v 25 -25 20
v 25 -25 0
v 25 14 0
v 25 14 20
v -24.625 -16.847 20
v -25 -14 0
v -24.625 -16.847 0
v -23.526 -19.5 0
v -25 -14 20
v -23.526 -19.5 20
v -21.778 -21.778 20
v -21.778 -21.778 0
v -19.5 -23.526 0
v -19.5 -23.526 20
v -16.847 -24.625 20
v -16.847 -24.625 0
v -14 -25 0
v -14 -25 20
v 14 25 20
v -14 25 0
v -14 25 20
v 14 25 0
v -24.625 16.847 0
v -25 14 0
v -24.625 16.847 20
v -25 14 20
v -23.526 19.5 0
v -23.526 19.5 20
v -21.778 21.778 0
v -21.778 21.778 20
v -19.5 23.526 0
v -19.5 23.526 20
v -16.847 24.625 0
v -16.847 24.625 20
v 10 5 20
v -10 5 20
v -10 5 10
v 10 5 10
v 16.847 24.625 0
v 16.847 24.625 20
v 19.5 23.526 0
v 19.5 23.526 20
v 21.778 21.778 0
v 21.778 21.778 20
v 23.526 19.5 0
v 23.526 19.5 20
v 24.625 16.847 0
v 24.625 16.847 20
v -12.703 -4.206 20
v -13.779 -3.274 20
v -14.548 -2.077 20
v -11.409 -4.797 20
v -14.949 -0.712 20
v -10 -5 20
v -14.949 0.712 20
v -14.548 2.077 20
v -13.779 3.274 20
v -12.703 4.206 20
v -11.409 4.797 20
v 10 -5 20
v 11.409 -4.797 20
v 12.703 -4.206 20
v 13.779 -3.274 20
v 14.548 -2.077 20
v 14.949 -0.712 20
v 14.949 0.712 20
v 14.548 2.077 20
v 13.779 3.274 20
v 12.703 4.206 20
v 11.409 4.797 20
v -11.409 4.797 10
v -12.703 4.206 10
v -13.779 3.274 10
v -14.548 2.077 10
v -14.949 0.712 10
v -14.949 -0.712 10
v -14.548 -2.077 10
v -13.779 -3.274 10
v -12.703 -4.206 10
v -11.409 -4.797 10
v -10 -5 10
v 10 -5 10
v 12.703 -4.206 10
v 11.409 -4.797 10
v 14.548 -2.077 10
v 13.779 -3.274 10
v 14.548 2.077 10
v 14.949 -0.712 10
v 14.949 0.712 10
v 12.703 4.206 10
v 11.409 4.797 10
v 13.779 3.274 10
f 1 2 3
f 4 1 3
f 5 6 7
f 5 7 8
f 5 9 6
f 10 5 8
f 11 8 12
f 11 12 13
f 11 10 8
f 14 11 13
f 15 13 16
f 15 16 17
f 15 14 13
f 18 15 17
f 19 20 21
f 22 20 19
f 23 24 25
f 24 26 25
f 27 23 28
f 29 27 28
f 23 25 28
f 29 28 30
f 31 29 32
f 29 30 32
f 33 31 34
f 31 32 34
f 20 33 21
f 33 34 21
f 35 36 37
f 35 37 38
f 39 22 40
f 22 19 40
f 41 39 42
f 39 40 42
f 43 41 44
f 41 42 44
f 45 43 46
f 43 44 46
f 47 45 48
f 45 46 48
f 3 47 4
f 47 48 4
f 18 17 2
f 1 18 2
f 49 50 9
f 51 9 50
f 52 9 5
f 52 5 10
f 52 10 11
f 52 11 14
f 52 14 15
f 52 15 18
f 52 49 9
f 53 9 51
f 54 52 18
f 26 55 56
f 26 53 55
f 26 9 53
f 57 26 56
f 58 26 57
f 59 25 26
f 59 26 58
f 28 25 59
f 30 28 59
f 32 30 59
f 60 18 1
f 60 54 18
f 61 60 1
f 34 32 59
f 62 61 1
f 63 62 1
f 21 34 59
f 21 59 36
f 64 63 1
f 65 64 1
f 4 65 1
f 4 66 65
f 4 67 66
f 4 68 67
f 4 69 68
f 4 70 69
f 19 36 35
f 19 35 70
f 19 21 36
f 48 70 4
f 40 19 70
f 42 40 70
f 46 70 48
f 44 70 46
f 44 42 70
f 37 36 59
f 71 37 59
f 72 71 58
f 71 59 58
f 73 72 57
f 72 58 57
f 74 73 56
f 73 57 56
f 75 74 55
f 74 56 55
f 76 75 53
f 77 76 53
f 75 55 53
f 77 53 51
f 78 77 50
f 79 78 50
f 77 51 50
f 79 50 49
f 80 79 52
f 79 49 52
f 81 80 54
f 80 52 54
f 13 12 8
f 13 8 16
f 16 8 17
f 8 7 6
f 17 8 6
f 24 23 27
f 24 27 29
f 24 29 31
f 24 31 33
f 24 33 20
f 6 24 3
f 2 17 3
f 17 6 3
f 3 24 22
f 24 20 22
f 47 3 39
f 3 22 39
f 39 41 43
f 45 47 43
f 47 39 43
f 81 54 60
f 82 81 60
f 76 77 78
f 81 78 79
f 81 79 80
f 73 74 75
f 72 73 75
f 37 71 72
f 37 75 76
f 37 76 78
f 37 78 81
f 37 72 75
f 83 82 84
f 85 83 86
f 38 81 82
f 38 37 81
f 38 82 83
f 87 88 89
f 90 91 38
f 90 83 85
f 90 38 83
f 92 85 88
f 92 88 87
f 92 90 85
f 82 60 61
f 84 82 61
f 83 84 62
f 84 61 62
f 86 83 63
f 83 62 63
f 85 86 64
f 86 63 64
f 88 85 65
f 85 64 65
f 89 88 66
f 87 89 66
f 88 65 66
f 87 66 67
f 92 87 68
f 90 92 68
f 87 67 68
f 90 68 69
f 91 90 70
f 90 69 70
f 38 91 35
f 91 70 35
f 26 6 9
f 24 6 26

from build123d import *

# Parameters (mm, degrees)
SKETCH_W     = 50
SKETCH_H     = 50
PAD_DEPTH    = 20
POCKET_DEPTH = 10
FILLET_R     = 11


with BuildPart() as part:
    # Sketch → Pad (new body)
    with BuildSketch(Plane.XY):
        Rectangle(SKETCH_W, SKETCH_H)
    extrude(amount=PAD_DEPTH)

    # Sketch001 → Pocket (cut)
    with BuildSketch(Plane.XY.offset(20)):
        with BuildLine():
            ThreePointArc((-10, 5), (-15, 0), (-10, -5))
            Line((-10, -5), (10, -5))
            ThreePointArc((10, -5), (15, 0), (10, 5))
            Line((-10, 5), (10, 5))
        make_face()
    extrude(amount=-POCKET_DEPTH, mode=Mode.SUBTRACT)

    # Fillet
    fillet_edges = [part.edges().sort_by_distance(p)[0] for p in [
        (-25, -25, 10),
        (-25, 25, 10),
        (25, 25, 10),
    ]]
    fillet(fillet_edges, radius=FILLET_R)


solid = part.part
